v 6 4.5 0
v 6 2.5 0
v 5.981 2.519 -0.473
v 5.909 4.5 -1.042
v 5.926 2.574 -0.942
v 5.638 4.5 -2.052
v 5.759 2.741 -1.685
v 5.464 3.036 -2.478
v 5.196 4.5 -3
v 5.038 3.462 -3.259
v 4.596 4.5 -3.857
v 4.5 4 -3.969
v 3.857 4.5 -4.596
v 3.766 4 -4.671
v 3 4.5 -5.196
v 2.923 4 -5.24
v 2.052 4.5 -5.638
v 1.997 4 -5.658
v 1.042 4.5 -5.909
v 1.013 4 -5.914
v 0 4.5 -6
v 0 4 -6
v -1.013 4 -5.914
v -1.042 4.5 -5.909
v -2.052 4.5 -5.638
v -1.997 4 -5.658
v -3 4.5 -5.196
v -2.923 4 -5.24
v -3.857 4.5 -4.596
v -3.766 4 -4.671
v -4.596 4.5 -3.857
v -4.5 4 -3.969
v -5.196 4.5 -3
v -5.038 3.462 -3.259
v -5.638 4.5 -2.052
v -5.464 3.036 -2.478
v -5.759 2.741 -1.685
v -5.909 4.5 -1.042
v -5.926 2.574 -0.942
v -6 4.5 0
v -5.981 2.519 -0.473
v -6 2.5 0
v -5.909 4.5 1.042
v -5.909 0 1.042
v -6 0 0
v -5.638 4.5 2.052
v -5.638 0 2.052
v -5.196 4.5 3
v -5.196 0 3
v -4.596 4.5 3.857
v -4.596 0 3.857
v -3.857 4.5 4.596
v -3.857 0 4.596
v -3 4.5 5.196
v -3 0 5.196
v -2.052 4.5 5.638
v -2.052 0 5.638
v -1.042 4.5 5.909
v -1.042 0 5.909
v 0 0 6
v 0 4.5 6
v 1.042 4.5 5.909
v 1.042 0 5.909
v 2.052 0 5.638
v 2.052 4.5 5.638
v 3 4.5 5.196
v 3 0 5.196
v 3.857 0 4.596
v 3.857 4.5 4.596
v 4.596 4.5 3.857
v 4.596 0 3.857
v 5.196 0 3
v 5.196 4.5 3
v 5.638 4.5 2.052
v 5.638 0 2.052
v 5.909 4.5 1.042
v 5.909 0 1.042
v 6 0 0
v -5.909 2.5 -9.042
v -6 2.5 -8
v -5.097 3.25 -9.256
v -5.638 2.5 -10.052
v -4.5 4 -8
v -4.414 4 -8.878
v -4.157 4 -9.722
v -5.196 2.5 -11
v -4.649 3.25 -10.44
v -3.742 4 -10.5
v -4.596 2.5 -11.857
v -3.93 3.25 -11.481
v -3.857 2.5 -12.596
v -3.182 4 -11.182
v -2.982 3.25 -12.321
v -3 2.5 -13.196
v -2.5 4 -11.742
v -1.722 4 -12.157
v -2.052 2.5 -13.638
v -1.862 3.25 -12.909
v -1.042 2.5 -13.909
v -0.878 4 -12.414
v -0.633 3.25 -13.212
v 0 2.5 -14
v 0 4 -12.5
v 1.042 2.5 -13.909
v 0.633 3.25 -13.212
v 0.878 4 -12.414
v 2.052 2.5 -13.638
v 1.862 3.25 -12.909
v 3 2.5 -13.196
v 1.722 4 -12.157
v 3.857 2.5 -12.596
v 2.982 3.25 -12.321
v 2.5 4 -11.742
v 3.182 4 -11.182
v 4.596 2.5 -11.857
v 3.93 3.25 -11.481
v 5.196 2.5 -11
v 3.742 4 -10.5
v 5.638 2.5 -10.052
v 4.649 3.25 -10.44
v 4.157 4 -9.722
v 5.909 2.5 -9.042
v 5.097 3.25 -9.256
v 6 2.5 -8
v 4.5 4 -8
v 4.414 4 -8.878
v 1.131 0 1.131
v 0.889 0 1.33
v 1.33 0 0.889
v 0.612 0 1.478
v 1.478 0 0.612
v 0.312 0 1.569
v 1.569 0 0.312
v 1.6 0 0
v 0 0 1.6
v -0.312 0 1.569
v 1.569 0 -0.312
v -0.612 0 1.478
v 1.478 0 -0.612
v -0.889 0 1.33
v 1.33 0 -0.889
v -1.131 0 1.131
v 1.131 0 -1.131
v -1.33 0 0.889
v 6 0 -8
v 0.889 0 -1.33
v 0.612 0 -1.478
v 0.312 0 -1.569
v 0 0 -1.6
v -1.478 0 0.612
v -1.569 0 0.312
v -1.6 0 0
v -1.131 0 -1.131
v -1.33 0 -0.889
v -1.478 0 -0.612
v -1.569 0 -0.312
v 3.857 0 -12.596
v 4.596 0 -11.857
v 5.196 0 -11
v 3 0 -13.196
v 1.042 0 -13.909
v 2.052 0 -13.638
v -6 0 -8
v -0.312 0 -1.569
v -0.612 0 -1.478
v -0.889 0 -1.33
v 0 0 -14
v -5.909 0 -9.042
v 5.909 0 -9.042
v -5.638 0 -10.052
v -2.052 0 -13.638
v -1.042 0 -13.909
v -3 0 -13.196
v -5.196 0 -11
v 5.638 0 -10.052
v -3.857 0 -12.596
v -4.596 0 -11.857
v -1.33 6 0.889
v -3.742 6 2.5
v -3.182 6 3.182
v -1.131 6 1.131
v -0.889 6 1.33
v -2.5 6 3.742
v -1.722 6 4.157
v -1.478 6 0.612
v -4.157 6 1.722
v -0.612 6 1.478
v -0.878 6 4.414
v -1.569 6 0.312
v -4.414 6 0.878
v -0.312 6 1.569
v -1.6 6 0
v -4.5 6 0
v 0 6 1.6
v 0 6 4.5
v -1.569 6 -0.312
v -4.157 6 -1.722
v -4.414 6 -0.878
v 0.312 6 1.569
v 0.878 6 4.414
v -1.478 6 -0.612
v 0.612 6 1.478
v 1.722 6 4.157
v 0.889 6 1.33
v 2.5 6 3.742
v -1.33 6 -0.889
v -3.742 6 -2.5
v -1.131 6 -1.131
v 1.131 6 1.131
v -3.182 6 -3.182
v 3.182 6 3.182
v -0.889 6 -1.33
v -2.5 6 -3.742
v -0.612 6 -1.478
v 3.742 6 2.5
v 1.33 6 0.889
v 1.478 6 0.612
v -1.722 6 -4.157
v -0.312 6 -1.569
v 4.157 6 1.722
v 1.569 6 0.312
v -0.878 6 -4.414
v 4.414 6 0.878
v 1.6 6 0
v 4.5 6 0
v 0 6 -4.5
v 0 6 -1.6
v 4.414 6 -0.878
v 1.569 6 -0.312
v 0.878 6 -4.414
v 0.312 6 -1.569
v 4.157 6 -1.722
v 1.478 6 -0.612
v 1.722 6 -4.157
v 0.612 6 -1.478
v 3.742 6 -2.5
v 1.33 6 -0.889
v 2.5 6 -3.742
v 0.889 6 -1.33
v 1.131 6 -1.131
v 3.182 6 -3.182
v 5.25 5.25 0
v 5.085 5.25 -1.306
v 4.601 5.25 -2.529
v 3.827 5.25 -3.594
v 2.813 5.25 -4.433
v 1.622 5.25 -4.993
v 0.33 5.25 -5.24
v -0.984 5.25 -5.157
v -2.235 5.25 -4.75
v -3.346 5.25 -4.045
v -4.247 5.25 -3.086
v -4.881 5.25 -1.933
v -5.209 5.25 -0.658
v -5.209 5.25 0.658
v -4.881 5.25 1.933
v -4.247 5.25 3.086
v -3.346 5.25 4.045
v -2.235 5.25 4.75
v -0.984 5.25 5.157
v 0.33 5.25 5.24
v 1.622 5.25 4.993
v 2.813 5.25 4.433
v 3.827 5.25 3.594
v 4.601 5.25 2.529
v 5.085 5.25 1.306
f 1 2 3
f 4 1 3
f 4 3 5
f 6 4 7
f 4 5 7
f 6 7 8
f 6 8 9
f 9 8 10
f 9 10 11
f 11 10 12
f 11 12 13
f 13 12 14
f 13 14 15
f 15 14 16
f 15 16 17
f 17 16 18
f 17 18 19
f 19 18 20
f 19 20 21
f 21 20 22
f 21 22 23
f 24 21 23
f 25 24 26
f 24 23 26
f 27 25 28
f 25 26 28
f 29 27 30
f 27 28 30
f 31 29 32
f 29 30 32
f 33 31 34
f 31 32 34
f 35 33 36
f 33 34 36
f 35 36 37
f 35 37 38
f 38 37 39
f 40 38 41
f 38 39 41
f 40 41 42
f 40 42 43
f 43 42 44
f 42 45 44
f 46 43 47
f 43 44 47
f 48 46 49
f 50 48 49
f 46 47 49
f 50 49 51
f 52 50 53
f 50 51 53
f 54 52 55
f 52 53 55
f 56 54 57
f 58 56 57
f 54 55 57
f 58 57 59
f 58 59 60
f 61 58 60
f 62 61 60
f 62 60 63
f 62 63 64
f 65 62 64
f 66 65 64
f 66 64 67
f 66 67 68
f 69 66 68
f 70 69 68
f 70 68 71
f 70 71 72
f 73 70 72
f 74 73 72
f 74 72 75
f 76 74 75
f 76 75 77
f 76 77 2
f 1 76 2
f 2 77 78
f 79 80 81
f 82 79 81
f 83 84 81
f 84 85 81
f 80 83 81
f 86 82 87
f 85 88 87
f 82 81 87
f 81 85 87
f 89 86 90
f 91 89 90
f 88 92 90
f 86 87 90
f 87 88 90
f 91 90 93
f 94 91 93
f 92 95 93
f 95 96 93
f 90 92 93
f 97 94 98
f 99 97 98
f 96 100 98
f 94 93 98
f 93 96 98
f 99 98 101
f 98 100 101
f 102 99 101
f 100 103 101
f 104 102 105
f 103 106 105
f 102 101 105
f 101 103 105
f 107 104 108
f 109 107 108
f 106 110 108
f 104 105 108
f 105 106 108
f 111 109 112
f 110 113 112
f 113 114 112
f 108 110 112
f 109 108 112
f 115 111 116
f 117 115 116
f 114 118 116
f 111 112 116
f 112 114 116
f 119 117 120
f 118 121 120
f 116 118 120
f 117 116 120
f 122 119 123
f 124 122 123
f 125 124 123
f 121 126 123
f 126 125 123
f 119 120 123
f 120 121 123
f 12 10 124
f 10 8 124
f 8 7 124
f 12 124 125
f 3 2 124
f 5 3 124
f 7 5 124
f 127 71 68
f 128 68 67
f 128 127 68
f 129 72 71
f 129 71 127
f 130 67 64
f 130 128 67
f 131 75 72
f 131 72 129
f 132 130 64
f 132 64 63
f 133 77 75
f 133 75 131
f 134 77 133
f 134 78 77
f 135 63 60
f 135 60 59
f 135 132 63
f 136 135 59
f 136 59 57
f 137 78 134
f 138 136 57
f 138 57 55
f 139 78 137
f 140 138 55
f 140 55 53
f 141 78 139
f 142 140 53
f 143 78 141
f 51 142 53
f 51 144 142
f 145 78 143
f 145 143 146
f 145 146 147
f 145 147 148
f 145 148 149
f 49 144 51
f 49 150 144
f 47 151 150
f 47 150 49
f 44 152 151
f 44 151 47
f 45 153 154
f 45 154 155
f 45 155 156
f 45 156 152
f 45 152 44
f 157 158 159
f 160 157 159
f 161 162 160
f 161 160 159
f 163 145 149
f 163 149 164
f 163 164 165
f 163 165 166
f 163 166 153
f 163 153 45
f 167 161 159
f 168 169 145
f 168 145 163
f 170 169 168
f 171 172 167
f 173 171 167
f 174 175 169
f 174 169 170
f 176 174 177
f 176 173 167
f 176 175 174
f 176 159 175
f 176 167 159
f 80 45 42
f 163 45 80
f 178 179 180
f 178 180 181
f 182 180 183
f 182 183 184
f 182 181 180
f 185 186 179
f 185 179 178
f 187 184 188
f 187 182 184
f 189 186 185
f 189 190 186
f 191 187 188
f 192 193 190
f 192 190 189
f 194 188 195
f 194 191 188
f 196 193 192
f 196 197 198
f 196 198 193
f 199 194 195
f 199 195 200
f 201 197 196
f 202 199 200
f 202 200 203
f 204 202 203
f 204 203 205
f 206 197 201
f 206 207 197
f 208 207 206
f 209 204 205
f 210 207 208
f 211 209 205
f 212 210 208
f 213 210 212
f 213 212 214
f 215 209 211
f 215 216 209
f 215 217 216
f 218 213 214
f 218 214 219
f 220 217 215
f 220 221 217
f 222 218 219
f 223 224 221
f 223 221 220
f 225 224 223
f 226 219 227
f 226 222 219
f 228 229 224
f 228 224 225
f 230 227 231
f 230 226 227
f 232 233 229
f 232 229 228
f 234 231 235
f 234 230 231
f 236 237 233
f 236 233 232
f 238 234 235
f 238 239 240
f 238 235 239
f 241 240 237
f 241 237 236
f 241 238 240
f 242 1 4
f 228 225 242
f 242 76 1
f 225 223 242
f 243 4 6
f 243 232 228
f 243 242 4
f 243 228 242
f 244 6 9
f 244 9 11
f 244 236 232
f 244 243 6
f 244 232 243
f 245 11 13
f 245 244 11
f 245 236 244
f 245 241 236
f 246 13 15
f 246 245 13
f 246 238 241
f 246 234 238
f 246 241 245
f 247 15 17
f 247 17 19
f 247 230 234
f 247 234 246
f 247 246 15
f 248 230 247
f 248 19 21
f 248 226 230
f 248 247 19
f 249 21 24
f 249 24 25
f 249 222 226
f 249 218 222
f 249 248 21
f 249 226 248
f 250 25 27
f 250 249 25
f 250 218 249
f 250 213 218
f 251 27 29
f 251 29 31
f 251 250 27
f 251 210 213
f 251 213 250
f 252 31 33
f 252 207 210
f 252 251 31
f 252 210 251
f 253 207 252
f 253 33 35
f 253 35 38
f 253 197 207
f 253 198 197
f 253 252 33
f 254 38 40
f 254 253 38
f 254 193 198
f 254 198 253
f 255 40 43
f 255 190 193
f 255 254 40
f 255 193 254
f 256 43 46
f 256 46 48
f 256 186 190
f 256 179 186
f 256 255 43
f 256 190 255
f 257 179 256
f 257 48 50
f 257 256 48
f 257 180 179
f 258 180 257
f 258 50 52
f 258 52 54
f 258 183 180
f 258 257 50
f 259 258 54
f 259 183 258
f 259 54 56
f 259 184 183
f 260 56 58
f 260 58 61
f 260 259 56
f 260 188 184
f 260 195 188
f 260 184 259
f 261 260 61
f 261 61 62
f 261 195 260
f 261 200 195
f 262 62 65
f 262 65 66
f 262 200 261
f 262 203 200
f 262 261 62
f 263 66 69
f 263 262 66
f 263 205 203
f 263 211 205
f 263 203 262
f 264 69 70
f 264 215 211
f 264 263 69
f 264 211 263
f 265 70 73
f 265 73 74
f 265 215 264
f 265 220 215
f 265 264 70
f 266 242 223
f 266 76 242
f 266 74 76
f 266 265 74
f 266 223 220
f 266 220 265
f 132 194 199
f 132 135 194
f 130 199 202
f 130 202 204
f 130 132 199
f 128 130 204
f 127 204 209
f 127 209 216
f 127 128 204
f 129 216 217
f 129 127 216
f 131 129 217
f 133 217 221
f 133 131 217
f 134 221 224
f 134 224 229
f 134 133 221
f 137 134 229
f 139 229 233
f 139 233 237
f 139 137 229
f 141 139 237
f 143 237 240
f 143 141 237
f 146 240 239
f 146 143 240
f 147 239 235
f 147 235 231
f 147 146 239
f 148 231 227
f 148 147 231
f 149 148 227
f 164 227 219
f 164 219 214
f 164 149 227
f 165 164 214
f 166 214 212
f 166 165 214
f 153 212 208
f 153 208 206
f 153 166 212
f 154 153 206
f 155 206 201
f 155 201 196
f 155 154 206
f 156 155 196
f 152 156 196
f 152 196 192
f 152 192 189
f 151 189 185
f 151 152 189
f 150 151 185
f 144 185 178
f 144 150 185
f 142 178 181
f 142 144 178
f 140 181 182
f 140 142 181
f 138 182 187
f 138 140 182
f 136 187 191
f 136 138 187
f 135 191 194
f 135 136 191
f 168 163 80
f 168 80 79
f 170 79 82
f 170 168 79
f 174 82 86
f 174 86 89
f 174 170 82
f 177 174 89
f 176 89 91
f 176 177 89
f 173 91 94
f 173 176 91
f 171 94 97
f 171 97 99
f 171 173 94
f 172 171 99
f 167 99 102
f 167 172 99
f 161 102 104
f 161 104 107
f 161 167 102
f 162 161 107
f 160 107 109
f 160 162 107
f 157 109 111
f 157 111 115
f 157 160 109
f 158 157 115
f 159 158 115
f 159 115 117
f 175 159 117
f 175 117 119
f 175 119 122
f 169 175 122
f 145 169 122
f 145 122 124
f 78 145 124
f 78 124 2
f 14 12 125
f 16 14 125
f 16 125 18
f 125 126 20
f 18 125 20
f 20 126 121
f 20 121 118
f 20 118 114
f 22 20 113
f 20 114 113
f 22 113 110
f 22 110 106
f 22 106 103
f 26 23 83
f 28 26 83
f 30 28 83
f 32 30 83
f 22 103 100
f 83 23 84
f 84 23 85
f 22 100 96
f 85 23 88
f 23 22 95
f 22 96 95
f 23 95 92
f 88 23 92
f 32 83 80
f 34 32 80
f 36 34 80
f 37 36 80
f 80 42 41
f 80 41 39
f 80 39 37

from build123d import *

# Parameters (mm, degrees)
SKETCH1_R           = 1.6
BOSS_EXTRUDE1_DEPTH = 4
SKETCH2_R           = 6
SKETCH2_R_2         = 1.6
BOSS_EXTRUDE2_DEPTH = 2
CHAMFER1_SIZE       = 1.5


with BuildPart() as part:
    # Sketch1 → Boss-Extrude1 (new body)
    with BuildSketch(Plane(origin=(0, 0, 0), x_dir=(1, 0, 0), z_dir=(0, 1, 0))):
        with BuildLine():
            Line((-6, 0), (-6, 8))
            ThreePointArc((-6, 8), (0, 14), (6, 8))
            Line((6, 8), (6, 0))
            ThreePointArc((6, 0), (0, -6), (-6, 0))
        make_face()
        with Locations(Location((0, 0, 0), (0, 0, 270))):
            Circle(SKETCH1_R, mode=Mode.SUBTRACT)
    extrude(amount=BOSS_EXTRUDE1_DEPTH)

    # Sketch2 → Boss-Extrude2 (add)
    with BuildSketch(Plane(origin=(0, 4, 0), x_dir=(1, 0, 0), z_dir=(0, 1, 0))):
        Circle(SKETCH2_R)
        with Locations(Location((0, 0, 0), (0, 0, 270))):
            Circle(SKETCH2_R_2, mode=Mode.SUBTRACT)
    extrude(amount=BOSS_EXTRUDE2_DEPTH)

    # Chamfer1
    # the kernel refuses this chamfer: 1.5 mm, written as the material it takes off along each edge
    with BuildSketch(Plane(origin=(0, 6, 0), x_dir=(1, 0, 0), z_dir=(0, 0, 1))) as chamfer1_piece_1:
        Polygon((6, -CHAMFER1_SIZE), (6 - CHAMFER1_SIZE, 0), (6, 0), align=None)
    revolve(axis=Axis((0, 6, 0), (0, 1, 0)), mode=Mode.SUBTRACT)
    with BuildSketch(Plane(origin=(6, 4, -8), x_dir=(0.0274958766105862, -0.9996219169112968, 0), z_dir=(0, 0, 1))) as chamfer1_piece_2_section:
        Polygon((CHAMFER1_SIZE * 0.999621916911, -CHAMFER1_SIZE * 0.0274958766106), (-CHAMFER1_SIZE * 0.0274958766106, -CHAMFER1_SIZE * 0.999621916911), (0, 0), align=None)
    chamfer1_piece_2 = extrude(amount=11.857524482, mode=Mode.PRIVATE)
    chamfer1_piece_2 = chamfer1_piece_2 - Plane(origin=(0, 3.415911746, 0), x_dir=(1, 0, 0), z_dir=(0, -1, 0)) * Cylinder(6, 30, mode=Mode.PRIVATE)
    add(chamfer1_piece_2, mode=Mode.SUBTRACT)
    with BuildSketch(Plane(origin=(0, 4, -8), x_dir=(-1, 0, 0), z_dir=(0, 0, 1))) as chamfer1_piece_3:
        Polygon((6, CHAMFER1_SIZE), (6 - CHAMFER1_SIZE, 0), (6, 0), align=None)
    revolve(axis=Axis((0, 4, -8), (0, -1, 0)), revolution_arc=180, mode=Mode.SUBTRACT)
    with BuildSketch(Plane(origin=(-6, 4, 3.857524482), x_dir=(0.9996219169112969, 0.02749587661058621, 0), z_dir=(0, 0, -1))) as chamfer1_piece_4_section:
        Polygon((CHAMFER1_SIZE * 0.999621916911, CHAMFER1_SIZE * 0.0274958766106), (-CHAMFER1_SIZE * 0.0274958766106, CHAMFER1_SIZE * 0.999621916911), (0, 0), align=None)
    chamfer1_piece_4 = extrude(amount=11.857524482, mode=Mode.PRIVATE)
    chamfer1_piece_4 = chamfer1_piece_4 - Plane(origin=(0, 3.415911747, 0), x_dir=(1, 0, 0), z_dir=(0, -1, 0)) * Cylinder(6, 30, mode=Mode.PRIVATE)
    add(chamfer1_piece_4, mode=Mode.SUBTRACT)


solid = part.part
